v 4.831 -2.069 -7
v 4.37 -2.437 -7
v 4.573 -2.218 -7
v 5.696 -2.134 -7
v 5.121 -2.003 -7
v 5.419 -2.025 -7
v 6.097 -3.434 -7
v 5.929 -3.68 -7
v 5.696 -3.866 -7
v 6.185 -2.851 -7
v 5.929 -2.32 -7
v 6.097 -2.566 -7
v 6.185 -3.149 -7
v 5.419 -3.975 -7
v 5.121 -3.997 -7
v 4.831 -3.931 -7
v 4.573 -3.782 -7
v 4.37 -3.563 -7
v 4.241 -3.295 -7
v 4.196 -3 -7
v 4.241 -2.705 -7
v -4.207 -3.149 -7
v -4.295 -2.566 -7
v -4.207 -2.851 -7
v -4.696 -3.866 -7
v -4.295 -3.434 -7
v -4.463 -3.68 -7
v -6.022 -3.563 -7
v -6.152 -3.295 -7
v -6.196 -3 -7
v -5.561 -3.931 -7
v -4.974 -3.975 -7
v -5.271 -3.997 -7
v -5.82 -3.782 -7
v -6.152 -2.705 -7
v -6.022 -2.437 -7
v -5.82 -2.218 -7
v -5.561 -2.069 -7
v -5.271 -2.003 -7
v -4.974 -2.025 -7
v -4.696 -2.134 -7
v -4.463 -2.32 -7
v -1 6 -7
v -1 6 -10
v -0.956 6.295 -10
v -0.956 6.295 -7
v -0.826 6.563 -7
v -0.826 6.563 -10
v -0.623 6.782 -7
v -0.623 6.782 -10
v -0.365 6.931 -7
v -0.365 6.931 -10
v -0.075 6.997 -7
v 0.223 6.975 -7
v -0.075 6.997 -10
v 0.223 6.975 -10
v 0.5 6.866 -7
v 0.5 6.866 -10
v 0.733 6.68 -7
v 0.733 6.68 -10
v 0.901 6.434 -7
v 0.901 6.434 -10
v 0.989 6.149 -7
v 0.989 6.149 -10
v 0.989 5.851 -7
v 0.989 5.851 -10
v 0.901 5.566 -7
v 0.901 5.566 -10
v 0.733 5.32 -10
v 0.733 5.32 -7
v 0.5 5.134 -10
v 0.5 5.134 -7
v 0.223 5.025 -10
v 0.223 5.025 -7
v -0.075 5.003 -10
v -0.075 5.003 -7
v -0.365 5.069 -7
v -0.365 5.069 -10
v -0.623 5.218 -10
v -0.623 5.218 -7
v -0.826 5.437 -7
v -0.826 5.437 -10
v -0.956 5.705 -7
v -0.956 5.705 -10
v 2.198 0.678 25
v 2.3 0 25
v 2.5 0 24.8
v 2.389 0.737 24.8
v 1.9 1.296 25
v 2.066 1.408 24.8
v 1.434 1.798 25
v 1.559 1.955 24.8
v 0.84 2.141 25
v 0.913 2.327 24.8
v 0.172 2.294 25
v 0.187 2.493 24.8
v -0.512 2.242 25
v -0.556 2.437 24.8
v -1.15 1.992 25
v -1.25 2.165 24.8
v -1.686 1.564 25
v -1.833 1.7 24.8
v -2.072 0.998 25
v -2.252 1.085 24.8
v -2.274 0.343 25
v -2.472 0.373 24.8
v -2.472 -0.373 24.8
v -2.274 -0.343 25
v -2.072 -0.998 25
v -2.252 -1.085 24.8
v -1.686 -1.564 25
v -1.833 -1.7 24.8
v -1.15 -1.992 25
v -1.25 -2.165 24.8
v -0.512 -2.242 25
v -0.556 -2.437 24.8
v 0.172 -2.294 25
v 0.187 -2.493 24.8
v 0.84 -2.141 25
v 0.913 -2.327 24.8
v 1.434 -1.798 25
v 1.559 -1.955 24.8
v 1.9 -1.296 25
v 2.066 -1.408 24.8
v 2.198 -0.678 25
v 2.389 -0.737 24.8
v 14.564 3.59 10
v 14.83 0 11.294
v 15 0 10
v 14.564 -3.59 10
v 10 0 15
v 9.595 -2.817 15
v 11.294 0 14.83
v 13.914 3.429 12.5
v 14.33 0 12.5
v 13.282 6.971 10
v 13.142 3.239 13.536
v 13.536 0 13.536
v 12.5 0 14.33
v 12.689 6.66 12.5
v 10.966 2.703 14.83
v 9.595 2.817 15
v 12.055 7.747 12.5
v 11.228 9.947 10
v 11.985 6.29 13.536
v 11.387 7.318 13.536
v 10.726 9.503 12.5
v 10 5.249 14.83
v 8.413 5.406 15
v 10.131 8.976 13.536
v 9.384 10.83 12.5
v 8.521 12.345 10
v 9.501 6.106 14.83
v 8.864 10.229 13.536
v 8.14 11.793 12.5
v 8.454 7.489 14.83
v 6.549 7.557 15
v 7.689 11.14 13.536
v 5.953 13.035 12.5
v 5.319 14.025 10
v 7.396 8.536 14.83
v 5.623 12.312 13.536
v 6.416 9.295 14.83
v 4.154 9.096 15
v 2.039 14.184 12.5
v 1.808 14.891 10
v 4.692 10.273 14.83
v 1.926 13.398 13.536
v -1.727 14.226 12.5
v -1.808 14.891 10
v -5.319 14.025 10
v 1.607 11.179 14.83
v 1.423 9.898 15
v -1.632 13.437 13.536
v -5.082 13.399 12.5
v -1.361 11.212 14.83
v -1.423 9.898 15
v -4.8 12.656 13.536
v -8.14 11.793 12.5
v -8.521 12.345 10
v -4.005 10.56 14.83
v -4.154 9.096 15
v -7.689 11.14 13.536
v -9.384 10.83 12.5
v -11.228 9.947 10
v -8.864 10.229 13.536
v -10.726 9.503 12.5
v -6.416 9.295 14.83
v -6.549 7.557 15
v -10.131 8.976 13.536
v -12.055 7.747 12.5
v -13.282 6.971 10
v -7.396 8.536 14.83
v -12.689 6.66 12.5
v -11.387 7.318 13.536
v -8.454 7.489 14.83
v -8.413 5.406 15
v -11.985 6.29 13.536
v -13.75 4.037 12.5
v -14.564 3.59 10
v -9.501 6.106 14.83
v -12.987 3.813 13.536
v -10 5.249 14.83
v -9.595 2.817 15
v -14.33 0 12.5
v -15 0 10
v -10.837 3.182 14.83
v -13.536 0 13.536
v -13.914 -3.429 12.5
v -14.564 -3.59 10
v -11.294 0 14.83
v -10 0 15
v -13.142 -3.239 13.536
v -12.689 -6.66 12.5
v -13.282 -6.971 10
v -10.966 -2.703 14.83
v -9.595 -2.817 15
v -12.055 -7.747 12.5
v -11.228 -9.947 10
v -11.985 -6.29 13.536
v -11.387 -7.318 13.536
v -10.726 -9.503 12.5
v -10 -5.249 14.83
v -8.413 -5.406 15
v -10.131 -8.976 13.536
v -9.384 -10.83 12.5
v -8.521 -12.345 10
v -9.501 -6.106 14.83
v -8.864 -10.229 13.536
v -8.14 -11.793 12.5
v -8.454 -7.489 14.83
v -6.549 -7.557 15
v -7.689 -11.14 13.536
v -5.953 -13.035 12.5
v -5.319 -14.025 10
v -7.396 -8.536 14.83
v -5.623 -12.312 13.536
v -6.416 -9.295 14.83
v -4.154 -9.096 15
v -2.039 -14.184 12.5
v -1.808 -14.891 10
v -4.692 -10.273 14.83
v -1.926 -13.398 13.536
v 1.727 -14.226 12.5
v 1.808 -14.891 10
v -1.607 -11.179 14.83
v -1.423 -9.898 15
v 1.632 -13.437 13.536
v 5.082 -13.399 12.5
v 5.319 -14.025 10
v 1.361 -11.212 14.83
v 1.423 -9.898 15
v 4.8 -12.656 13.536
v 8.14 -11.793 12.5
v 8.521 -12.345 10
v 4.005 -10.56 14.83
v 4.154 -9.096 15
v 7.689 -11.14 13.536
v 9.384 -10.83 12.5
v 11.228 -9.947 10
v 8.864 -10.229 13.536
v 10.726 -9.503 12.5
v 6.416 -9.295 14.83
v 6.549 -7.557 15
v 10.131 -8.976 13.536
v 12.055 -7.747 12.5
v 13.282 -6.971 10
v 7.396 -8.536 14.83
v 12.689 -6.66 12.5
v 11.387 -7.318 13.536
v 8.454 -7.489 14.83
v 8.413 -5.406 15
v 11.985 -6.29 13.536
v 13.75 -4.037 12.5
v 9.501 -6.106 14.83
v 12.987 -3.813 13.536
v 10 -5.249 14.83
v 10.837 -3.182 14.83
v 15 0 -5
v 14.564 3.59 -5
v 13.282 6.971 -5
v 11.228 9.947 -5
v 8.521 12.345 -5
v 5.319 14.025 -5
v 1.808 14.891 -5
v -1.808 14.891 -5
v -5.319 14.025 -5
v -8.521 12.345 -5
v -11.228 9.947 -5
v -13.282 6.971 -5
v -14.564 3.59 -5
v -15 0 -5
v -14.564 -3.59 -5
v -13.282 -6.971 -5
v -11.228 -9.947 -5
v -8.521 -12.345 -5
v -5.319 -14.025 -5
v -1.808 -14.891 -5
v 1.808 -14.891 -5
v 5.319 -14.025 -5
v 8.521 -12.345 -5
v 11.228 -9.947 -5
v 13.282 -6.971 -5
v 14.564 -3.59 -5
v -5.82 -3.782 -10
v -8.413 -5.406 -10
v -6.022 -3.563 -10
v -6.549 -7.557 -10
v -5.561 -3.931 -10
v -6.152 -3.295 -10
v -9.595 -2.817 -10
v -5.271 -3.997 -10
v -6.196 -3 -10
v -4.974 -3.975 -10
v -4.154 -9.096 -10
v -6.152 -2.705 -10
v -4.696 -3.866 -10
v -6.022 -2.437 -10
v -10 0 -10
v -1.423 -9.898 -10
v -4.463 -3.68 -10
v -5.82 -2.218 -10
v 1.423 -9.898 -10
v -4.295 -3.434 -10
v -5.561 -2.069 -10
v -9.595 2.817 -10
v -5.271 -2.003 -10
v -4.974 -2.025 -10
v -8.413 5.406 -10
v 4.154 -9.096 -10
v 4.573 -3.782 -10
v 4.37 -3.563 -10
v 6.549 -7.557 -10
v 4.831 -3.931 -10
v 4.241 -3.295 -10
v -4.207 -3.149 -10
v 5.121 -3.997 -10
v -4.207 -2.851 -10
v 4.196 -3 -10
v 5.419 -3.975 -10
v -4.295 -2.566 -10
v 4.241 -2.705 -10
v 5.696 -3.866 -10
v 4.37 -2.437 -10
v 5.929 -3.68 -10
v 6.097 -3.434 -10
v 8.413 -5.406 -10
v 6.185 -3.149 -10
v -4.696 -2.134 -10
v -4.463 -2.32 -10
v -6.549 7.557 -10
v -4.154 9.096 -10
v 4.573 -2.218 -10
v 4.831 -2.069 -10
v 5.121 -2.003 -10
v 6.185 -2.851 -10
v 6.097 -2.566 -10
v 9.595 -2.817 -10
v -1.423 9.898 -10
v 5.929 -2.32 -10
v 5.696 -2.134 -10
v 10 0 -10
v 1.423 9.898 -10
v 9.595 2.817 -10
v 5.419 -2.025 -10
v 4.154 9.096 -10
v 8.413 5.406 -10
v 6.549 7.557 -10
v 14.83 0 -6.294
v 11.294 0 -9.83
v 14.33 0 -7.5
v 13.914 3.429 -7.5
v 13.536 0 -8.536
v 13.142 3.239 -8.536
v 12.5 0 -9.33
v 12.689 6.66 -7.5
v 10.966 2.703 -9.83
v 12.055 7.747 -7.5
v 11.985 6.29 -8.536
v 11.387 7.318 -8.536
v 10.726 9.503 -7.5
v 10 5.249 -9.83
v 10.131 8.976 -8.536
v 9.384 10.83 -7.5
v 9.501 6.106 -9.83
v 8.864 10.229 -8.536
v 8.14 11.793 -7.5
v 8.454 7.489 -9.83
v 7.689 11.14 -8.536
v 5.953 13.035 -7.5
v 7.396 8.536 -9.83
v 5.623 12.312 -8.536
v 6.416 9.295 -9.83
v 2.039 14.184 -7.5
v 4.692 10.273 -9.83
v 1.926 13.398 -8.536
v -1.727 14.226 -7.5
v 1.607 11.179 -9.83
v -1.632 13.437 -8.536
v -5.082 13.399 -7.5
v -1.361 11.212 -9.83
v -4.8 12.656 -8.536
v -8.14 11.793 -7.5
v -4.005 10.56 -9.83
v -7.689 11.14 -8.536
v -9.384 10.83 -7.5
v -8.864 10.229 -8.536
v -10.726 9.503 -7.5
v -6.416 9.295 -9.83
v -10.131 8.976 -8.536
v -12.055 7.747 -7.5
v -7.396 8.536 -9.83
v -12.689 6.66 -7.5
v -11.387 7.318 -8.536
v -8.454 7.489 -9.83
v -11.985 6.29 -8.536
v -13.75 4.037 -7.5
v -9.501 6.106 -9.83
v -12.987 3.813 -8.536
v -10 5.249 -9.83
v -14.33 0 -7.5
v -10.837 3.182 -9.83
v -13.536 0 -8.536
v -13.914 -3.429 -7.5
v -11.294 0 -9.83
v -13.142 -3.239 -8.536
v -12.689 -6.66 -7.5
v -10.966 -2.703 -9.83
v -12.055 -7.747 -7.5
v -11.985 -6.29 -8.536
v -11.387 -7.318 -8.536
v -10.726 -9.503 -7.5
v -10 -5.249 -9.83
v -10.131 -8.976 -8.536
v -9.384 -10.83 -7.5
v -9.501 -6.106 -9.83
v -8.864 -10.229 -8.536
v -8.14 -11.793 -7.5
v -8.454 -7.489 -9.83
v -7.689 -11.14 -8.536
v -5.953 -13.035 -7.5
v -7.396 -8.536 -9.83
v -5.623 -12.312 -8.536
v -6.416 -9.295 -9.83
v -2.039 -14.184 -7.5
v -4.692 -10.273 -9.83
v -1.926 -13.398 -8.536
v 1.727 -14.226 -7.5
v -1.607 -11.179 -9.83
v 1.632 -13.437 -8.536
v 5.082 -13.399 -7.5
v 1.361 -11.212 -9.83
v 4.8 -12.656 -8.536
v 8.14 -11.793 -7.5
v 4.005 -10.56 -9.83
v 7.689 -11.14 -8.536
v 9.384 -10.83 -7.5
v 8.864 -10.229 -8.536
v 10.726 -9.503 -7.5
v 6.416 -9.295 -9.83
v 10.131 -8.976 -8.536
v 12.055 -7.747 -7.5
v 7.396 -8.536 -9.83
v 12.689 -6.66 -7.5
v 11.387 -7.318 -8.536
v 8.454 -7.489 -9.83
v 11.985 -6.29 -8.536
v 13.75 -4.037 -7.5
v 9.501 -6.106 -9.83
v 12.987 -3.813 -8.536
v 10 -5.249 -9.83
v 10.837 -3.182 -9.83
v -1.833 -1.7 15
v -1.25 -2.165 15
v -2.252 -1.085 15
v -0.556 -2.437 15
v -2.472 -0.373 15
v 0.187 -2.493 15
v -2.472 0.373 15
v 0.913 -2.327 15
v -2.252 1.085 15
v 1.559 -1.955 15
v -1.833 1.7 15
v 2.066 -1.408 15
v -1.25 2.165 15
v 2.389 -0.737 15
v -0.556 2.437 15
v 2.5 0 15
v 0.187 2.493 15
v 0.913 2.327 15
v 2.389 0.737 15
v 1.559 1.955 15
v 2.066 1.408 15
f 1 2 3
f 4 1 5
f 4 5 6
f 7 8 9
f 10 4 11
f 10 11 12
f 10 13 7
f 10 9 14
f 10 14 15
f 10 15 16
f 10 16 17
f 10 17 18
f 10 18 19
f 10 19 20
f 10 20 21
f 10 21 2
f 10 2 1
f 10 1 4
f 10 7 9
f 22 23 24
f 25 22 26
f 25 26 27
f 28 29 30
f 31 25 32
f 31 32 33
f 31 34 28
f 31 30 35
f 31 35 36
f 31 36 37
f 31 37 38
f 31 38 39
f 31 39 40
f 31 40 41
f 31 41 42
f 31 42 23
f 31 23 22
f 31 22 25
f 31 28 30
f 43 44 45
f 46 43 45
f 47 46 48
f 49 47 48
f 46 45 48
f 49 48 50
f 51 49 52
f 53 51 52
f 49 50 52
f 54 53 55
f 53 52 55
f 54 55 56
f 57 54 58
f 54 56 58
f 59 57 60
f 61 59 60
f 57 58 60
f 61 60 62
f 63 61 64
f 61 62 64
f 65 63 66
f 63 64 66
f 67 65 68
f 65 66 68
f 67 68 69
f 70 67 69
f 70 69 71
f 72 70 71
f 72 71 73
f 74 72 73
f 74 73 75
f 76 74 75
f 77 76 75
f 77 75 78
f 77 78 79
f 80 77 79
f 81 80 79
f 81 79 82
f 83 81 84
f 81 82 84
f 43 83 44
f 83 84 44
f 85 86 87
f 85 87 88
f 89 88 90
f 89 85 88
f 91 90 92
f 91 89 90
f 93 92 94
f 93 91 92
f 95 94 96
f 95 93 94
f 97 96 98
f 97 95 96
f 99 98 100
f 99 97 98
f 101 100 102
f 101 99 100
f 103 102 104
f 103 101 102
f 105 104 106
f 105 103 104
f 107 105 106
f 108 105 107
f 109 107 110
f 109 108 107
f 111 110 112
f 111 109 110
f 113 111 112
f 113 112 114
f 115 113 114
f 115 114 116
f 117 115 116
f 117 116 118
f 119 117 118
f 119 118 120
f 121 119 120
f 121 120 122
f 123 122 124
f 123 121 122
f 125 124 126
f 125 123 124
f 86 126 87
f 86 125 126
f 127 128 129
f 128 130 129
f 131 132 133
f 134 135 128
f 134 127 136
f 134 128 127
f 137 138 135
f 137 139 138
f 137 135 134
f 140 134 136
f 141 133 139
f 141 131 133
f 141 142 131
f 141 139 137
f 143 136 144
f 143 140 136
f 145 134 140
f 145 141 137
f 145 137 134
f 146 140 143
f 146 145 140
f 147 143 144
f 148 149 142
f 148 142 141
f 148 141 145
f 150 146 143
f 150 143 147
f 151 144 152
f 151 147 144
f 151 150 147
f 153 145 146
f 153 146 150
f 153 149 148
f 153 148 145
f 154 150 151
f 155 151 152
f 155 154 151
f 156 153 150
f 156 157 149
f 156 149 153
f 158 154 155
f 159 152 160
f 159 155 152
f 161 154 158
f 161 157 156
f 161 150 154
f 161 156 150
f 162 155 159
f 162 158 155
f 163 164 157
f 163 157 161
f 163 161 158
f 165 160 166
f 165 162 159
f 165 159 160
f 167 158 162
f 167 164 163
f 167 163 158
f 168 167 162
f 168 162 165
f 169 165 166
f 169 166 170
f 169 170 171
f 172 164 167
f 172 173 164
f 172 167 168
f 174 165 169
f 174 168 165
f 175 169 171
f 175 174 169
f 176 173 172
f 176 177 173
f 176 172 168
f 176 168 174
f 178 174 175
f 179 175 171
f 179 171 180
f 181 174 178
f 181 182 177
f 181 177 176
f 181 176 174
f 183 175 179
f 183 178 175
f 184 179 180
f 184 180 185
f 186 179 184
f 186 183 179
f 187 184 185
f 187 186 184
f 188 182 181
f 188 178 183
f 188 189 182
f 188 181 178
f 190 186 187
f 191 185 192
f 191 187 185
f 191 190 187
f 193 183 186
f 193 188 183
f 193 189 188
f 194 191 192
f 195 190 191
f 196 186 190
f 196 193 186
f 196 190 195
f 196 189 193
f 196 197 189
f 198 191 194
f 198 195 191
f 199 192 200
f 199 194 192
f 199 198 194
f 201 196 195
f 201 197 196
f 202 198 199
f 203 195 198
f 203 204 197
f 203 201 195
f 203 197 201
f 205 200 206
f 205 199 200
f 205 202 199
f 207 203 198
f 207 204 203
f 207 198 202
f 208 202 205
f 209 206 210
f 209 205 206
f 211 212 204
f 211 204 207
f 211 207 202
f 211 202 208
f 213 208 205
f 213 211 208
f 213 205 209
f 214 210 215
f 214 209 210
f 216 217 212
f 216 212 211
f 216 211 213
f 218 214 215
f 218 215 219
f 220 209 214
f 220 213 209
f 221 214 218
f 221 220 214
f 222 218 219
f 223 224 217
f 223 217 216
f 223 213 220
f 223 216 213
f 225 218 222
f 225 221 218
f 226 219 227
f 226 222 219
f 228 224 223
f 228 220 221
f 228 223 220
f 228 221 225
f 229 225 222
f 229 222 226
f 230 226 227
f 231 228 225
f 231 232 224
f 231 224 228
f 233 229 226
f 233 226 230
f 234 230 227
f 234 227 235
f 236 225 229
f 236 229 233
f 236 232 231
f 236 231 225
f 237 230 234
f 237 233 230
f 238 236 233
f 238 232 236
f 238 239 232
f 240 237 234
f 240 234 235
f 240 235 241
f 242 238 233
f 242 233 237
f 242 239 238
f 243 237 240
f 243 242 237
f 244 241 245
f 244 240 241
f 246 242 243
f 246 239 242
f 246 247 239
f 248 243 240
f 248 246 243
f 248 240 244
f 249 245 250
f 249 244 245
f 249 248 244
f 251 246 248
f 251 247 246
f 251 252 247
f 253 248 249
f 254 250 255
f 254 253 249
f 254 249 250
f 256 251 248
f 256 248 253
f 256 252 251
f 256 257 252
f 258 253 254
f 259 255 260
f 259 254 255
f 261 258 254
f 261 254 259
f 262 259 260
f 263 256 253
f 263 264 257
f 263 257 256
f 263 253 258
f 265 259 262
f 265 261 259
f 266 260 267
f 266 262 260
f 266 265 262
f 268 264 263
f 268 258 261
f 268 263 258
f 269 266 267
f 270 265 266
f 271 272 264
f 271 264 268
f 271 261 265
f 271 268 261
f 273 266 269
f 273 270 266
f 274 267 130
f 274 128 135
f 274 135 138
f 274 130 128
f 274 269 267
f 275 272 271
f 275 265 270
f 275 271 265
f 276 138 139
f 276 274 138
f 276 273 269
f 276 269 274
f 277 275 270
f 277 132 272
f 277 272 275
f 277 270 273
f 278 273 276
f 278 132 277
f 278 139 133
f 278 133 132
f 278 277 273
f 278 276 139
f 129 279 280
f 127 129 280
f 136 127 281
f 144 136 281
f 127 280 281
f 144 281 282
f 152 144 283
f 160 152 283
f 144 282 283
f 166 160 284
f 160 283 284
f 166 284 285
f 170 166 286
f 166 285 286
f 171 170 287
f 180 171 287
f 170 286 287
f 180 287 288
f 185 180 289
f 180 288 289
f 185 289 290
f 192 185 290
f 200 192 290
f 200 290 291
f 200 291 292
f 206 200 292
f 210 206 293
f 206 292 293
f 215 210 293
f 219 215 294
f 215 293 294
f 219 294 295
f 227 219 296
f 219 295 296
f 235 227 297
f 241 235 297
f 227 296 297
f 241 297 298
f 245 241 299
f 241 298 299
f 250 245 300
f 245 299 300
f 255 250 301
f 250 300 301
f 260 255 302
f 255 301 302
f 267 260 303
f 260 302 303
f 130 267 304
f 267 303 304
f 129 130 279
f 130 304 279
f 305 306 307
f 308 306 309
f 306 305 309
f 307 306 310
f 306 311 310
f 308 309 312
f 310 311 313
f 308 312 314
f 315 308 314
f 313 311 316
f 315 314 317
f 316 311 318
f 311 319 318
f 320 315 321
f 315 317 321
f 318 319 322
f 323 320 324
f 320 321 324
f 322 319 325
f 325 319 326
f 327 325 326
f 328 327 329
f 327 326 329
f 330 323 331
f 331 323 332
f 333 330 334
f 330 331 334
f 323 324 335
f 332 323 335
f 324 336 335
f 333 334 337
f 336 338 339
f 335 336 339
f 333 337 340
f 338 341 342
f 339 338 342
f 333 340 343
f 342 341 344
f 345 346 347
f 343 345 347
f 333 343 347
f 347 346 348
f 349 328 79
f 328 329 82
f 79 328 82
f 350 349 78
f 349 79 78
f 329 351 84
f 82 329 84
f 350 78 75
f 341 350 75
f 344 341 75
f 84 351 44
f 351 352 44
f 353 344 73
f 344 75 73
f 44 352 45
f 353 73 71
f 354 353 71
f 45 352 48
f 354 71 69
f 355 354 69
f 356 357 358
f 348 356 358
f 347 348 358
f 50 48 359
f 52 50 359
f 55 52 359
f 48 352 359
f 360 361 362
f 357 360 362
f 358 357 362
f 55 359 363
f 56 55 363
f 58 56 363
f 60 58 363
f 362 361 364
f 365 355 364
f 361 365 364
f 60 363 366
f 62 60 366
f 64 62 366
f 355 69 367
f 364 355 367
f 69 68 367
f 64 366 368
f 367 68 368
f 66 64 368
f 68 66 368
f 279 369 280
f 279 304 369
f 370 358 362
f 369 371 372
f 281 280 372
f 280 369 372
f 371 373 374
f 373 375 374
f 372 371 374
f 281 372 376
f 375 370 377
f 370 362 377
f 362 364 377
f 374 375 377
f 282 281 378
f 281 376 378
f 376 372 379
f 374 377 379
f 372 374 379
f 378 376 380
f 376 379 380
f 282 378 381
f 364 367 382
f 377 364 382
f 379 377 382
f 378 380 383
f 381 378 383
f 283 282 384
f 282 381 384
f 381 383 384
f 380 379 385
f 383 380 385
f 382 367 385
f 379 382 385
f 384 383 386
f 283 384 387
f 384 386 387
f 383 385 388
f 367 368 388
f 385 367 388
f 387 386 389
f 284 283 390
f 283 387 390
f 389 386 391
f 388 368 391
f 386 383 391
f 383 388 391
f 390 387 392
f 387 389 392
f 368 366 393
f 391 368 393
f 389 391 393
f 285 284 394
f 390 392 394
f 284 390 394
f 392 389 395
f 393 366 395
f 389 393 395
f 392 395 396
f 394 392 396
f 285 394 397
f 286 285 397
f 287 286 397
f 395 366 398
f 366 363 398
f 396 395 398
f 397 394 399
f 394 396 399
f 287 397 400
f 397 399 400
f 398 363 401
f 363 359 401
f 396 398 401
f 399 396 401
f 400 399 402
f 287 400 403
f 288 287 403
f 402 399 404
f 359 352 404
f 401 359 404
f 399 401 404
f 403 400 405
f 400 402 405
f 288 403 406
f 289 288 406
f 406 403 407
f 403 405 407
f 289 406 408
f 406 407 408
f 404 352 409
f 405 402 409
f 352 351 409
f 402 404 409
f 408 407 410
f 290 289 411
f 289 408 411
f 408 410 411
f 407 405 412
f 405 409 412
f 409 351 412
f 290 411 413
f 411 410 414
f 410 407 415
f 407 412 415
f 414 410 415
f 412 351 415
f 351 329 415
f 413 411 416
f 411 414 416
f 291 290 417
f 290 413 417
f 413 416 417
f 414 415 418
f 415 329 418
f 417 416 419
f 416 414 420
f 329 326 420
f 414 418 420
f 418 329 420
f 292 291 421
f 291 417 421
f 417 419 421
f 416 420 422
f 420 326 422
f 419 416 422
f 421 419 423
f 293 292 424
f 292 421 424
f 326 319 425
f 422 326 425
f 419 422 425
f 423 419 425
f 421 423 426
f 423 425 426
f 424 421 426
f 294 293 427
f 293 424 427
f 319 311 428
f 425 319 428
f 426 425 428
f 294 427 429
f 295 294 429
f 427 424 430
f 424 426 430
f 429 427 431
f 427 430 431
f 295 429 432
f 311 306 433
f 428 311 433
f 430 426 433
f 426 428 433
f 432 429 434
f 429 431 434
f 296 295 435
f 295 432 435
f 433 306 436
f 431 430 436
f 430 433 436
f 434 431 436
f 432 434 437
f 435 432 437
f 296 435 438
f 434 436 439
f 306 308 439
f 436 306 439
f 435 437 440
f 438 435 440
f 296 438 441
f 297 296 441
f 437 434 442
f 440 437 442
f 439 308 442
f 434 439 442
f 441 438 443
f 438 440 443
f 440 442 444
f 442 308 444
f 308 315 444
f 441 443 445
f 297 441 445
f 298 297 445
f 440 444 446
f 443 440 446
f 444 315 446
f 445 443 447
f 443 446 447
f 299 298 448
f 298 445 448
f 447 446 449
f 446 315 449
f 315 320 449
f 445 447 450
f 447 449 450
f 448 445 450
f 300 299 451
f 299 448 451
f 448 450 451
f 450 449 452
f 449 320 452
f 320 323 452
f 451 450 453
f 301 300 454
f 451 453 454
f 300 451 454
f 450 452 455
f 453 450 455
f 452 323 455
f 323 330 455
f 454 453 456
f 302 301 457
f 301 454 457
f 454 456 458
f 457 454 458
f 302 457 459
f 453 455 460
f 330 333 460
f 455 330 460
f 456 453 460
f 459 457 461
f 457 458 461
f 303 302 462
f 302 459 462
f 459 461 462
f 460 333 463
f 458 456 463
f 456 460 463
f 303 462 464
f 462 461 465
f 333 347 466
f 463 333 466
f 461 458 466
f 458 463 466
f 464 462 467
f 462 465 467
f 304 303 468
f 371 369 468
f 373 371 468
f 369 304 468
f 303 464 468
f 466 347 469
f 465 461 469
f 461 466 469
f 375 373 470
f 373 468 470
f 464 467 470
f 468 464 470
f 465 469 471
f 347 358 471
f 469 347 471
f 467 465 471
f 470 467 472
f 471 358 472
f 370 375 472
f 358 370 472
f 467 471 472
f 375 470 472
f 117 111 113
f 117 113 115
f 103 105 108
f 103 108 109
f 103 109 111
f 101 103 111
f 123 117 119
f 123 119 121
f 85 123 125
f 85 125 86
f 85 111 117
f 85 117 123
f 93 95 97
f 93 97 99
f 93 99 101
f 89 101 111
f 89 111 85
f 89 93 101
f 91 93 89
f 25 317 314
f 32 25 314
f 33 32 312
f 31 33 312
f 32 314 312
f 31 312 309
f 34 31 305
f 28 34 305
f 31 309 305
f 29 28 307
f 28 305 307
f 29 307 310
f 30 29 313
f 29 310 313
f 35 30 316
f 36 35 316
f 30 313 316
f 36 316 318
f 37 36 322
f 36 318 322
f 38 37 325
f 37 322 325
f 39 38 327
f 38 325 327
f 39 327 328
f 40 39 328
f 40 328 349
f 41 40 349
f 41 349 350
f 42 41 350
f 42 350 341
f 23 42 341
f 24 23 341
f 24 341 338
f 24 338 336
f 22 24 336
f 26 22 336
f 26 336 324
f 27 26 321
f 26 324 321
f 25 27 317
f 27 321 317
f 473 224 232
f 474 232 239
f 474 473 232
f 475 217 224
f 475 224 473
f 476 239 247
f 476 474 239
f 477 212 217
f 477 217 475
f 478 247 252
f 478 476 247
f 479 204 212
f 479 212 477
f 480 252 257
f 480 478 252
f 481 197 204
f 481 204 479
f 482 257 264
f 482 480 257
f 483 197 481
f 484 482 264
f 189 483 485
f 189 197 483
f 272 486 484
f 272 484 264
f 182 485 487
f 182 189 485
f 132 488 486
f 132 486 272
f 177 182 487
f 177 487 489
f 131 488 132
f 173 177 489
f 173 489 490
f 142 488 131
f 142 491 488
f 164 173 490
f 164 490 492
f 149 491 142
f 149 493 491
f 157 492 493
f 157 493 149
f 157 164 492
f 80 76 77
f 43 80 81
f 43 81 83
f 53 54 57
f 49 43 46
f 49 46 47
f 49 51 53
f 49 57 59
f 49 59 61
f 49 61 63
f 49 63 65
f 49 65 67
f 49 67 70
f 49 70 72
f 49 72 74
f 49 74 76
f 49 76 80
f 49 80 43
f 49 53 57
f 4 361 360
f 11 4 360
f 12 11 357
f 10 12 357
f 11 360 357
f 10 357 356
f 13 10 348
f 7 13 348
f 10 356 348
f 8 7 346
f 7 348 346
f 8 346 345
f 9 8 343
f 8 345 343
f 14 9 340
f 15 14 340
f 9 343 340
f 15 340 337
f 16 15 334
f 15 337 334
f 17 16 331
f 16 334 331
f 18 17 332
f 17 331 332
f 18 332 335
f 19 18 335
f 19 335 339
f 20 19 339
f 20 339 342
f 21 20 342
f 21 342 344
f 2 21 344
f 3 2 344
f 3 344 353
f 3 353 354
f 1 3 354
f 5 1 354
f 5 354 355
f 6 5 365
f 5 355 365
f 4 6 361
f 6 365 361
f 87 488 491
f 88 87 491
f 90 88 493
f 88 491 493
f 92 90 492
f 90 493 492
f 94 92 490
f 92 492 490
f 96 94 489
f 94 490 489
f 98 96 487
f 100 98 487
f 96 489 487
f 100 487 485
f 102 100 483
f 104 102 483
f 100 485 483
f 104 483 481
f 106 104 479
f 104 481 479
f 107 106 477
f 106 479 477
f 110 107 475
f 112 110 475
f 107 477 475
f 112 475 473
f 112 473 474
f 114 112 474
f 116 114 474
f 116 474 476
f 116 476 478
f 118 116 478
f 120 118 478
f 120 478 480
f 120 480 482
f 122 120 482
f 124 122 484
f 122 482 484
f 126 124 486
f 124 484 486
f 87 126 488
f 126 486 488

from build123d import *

# Parameters (mm, degrees)
BOSS_EXTRUDE1_DEPTH      = 15
BOSS_EXTRUDE1_DEPTH_BACK = 10
SKETCH1_R                = 15
FILLET1_R                = 5
SKETCH2_R                = 2.5
BOSS_EXTRUDE2_DEPTH      = 10
CHAMFER1_SIZE            = 0.2
SKETCH3_R                = 1
CUT_EXTRUDE1_DEPTH       = 3
CIRPATTERN1_COUNT        = 3


with BuildPart() as part:
    # Sketch1 → Boss-Extrude1 (new, two sides: drawn at the far end of the back side and taken through both)
    with BuildSketch(Plane.XY.offset(-BOSS_EXTRUDE1_DEPTH_BACK)):
        Circle(SKETCH1_R)
    extrude(amount=BOSS_EXTRUDE1_DEPTH + BOSS_EXTRUDE1_DEPTH_BACK)

    # Fillet1
    fillet1_edges = [part.edges().sort_by_distance(p)[0] for p in [
        (-15, 0, -10),
        (-15, 0, 15),
    ]]
    fillet(fillet1_edges, radius=FILLET1_R)

    # Sketch2 → Boss-Extrude2 (add)
    with BuildSketch(Plane.XY.offset(15)):
        Circle(SKETCH2_R)
    extrude(amount=BOSS_EXTRUDE2_DEPTH)

    # Chamfer1
    chamfer1_edges = [part.edges().sort_by_distance(p)[0] for p in [
        (-2.5, 0, 25),
    ]]
    chamfer(chamfer1_edges, length=CHAMFER1_SIZE)

    # Sketch3 → Cut-Extrude1 (cut)
    with BuildSketch(Plane(origin=(0, 0, -10), x_dir=(-1, 0, 0), z_dir=(0, 0, -1))):
        with Locations((0, 6)):
            Circle(SKETCH3_R)
    cut_extrude1 = extrude(amount=-CUT_EXTRUDE1_DEPTH, mode=Mode.SUBTRACT)

    # CirPattern1: Cut-Extrude1 ×3 about axis
    cirpattern1_axis = Axis((0, 0, 0), (0, 0, 1))
    for i in range(1, CIRPATTERN1_COUNT):
        add(cut_extrude1.rotate(cirpattern1_axis, i * 360 / CIRPATTERN1_COUNT), mode=Mode.SUBTRACT)


solid = part.part
